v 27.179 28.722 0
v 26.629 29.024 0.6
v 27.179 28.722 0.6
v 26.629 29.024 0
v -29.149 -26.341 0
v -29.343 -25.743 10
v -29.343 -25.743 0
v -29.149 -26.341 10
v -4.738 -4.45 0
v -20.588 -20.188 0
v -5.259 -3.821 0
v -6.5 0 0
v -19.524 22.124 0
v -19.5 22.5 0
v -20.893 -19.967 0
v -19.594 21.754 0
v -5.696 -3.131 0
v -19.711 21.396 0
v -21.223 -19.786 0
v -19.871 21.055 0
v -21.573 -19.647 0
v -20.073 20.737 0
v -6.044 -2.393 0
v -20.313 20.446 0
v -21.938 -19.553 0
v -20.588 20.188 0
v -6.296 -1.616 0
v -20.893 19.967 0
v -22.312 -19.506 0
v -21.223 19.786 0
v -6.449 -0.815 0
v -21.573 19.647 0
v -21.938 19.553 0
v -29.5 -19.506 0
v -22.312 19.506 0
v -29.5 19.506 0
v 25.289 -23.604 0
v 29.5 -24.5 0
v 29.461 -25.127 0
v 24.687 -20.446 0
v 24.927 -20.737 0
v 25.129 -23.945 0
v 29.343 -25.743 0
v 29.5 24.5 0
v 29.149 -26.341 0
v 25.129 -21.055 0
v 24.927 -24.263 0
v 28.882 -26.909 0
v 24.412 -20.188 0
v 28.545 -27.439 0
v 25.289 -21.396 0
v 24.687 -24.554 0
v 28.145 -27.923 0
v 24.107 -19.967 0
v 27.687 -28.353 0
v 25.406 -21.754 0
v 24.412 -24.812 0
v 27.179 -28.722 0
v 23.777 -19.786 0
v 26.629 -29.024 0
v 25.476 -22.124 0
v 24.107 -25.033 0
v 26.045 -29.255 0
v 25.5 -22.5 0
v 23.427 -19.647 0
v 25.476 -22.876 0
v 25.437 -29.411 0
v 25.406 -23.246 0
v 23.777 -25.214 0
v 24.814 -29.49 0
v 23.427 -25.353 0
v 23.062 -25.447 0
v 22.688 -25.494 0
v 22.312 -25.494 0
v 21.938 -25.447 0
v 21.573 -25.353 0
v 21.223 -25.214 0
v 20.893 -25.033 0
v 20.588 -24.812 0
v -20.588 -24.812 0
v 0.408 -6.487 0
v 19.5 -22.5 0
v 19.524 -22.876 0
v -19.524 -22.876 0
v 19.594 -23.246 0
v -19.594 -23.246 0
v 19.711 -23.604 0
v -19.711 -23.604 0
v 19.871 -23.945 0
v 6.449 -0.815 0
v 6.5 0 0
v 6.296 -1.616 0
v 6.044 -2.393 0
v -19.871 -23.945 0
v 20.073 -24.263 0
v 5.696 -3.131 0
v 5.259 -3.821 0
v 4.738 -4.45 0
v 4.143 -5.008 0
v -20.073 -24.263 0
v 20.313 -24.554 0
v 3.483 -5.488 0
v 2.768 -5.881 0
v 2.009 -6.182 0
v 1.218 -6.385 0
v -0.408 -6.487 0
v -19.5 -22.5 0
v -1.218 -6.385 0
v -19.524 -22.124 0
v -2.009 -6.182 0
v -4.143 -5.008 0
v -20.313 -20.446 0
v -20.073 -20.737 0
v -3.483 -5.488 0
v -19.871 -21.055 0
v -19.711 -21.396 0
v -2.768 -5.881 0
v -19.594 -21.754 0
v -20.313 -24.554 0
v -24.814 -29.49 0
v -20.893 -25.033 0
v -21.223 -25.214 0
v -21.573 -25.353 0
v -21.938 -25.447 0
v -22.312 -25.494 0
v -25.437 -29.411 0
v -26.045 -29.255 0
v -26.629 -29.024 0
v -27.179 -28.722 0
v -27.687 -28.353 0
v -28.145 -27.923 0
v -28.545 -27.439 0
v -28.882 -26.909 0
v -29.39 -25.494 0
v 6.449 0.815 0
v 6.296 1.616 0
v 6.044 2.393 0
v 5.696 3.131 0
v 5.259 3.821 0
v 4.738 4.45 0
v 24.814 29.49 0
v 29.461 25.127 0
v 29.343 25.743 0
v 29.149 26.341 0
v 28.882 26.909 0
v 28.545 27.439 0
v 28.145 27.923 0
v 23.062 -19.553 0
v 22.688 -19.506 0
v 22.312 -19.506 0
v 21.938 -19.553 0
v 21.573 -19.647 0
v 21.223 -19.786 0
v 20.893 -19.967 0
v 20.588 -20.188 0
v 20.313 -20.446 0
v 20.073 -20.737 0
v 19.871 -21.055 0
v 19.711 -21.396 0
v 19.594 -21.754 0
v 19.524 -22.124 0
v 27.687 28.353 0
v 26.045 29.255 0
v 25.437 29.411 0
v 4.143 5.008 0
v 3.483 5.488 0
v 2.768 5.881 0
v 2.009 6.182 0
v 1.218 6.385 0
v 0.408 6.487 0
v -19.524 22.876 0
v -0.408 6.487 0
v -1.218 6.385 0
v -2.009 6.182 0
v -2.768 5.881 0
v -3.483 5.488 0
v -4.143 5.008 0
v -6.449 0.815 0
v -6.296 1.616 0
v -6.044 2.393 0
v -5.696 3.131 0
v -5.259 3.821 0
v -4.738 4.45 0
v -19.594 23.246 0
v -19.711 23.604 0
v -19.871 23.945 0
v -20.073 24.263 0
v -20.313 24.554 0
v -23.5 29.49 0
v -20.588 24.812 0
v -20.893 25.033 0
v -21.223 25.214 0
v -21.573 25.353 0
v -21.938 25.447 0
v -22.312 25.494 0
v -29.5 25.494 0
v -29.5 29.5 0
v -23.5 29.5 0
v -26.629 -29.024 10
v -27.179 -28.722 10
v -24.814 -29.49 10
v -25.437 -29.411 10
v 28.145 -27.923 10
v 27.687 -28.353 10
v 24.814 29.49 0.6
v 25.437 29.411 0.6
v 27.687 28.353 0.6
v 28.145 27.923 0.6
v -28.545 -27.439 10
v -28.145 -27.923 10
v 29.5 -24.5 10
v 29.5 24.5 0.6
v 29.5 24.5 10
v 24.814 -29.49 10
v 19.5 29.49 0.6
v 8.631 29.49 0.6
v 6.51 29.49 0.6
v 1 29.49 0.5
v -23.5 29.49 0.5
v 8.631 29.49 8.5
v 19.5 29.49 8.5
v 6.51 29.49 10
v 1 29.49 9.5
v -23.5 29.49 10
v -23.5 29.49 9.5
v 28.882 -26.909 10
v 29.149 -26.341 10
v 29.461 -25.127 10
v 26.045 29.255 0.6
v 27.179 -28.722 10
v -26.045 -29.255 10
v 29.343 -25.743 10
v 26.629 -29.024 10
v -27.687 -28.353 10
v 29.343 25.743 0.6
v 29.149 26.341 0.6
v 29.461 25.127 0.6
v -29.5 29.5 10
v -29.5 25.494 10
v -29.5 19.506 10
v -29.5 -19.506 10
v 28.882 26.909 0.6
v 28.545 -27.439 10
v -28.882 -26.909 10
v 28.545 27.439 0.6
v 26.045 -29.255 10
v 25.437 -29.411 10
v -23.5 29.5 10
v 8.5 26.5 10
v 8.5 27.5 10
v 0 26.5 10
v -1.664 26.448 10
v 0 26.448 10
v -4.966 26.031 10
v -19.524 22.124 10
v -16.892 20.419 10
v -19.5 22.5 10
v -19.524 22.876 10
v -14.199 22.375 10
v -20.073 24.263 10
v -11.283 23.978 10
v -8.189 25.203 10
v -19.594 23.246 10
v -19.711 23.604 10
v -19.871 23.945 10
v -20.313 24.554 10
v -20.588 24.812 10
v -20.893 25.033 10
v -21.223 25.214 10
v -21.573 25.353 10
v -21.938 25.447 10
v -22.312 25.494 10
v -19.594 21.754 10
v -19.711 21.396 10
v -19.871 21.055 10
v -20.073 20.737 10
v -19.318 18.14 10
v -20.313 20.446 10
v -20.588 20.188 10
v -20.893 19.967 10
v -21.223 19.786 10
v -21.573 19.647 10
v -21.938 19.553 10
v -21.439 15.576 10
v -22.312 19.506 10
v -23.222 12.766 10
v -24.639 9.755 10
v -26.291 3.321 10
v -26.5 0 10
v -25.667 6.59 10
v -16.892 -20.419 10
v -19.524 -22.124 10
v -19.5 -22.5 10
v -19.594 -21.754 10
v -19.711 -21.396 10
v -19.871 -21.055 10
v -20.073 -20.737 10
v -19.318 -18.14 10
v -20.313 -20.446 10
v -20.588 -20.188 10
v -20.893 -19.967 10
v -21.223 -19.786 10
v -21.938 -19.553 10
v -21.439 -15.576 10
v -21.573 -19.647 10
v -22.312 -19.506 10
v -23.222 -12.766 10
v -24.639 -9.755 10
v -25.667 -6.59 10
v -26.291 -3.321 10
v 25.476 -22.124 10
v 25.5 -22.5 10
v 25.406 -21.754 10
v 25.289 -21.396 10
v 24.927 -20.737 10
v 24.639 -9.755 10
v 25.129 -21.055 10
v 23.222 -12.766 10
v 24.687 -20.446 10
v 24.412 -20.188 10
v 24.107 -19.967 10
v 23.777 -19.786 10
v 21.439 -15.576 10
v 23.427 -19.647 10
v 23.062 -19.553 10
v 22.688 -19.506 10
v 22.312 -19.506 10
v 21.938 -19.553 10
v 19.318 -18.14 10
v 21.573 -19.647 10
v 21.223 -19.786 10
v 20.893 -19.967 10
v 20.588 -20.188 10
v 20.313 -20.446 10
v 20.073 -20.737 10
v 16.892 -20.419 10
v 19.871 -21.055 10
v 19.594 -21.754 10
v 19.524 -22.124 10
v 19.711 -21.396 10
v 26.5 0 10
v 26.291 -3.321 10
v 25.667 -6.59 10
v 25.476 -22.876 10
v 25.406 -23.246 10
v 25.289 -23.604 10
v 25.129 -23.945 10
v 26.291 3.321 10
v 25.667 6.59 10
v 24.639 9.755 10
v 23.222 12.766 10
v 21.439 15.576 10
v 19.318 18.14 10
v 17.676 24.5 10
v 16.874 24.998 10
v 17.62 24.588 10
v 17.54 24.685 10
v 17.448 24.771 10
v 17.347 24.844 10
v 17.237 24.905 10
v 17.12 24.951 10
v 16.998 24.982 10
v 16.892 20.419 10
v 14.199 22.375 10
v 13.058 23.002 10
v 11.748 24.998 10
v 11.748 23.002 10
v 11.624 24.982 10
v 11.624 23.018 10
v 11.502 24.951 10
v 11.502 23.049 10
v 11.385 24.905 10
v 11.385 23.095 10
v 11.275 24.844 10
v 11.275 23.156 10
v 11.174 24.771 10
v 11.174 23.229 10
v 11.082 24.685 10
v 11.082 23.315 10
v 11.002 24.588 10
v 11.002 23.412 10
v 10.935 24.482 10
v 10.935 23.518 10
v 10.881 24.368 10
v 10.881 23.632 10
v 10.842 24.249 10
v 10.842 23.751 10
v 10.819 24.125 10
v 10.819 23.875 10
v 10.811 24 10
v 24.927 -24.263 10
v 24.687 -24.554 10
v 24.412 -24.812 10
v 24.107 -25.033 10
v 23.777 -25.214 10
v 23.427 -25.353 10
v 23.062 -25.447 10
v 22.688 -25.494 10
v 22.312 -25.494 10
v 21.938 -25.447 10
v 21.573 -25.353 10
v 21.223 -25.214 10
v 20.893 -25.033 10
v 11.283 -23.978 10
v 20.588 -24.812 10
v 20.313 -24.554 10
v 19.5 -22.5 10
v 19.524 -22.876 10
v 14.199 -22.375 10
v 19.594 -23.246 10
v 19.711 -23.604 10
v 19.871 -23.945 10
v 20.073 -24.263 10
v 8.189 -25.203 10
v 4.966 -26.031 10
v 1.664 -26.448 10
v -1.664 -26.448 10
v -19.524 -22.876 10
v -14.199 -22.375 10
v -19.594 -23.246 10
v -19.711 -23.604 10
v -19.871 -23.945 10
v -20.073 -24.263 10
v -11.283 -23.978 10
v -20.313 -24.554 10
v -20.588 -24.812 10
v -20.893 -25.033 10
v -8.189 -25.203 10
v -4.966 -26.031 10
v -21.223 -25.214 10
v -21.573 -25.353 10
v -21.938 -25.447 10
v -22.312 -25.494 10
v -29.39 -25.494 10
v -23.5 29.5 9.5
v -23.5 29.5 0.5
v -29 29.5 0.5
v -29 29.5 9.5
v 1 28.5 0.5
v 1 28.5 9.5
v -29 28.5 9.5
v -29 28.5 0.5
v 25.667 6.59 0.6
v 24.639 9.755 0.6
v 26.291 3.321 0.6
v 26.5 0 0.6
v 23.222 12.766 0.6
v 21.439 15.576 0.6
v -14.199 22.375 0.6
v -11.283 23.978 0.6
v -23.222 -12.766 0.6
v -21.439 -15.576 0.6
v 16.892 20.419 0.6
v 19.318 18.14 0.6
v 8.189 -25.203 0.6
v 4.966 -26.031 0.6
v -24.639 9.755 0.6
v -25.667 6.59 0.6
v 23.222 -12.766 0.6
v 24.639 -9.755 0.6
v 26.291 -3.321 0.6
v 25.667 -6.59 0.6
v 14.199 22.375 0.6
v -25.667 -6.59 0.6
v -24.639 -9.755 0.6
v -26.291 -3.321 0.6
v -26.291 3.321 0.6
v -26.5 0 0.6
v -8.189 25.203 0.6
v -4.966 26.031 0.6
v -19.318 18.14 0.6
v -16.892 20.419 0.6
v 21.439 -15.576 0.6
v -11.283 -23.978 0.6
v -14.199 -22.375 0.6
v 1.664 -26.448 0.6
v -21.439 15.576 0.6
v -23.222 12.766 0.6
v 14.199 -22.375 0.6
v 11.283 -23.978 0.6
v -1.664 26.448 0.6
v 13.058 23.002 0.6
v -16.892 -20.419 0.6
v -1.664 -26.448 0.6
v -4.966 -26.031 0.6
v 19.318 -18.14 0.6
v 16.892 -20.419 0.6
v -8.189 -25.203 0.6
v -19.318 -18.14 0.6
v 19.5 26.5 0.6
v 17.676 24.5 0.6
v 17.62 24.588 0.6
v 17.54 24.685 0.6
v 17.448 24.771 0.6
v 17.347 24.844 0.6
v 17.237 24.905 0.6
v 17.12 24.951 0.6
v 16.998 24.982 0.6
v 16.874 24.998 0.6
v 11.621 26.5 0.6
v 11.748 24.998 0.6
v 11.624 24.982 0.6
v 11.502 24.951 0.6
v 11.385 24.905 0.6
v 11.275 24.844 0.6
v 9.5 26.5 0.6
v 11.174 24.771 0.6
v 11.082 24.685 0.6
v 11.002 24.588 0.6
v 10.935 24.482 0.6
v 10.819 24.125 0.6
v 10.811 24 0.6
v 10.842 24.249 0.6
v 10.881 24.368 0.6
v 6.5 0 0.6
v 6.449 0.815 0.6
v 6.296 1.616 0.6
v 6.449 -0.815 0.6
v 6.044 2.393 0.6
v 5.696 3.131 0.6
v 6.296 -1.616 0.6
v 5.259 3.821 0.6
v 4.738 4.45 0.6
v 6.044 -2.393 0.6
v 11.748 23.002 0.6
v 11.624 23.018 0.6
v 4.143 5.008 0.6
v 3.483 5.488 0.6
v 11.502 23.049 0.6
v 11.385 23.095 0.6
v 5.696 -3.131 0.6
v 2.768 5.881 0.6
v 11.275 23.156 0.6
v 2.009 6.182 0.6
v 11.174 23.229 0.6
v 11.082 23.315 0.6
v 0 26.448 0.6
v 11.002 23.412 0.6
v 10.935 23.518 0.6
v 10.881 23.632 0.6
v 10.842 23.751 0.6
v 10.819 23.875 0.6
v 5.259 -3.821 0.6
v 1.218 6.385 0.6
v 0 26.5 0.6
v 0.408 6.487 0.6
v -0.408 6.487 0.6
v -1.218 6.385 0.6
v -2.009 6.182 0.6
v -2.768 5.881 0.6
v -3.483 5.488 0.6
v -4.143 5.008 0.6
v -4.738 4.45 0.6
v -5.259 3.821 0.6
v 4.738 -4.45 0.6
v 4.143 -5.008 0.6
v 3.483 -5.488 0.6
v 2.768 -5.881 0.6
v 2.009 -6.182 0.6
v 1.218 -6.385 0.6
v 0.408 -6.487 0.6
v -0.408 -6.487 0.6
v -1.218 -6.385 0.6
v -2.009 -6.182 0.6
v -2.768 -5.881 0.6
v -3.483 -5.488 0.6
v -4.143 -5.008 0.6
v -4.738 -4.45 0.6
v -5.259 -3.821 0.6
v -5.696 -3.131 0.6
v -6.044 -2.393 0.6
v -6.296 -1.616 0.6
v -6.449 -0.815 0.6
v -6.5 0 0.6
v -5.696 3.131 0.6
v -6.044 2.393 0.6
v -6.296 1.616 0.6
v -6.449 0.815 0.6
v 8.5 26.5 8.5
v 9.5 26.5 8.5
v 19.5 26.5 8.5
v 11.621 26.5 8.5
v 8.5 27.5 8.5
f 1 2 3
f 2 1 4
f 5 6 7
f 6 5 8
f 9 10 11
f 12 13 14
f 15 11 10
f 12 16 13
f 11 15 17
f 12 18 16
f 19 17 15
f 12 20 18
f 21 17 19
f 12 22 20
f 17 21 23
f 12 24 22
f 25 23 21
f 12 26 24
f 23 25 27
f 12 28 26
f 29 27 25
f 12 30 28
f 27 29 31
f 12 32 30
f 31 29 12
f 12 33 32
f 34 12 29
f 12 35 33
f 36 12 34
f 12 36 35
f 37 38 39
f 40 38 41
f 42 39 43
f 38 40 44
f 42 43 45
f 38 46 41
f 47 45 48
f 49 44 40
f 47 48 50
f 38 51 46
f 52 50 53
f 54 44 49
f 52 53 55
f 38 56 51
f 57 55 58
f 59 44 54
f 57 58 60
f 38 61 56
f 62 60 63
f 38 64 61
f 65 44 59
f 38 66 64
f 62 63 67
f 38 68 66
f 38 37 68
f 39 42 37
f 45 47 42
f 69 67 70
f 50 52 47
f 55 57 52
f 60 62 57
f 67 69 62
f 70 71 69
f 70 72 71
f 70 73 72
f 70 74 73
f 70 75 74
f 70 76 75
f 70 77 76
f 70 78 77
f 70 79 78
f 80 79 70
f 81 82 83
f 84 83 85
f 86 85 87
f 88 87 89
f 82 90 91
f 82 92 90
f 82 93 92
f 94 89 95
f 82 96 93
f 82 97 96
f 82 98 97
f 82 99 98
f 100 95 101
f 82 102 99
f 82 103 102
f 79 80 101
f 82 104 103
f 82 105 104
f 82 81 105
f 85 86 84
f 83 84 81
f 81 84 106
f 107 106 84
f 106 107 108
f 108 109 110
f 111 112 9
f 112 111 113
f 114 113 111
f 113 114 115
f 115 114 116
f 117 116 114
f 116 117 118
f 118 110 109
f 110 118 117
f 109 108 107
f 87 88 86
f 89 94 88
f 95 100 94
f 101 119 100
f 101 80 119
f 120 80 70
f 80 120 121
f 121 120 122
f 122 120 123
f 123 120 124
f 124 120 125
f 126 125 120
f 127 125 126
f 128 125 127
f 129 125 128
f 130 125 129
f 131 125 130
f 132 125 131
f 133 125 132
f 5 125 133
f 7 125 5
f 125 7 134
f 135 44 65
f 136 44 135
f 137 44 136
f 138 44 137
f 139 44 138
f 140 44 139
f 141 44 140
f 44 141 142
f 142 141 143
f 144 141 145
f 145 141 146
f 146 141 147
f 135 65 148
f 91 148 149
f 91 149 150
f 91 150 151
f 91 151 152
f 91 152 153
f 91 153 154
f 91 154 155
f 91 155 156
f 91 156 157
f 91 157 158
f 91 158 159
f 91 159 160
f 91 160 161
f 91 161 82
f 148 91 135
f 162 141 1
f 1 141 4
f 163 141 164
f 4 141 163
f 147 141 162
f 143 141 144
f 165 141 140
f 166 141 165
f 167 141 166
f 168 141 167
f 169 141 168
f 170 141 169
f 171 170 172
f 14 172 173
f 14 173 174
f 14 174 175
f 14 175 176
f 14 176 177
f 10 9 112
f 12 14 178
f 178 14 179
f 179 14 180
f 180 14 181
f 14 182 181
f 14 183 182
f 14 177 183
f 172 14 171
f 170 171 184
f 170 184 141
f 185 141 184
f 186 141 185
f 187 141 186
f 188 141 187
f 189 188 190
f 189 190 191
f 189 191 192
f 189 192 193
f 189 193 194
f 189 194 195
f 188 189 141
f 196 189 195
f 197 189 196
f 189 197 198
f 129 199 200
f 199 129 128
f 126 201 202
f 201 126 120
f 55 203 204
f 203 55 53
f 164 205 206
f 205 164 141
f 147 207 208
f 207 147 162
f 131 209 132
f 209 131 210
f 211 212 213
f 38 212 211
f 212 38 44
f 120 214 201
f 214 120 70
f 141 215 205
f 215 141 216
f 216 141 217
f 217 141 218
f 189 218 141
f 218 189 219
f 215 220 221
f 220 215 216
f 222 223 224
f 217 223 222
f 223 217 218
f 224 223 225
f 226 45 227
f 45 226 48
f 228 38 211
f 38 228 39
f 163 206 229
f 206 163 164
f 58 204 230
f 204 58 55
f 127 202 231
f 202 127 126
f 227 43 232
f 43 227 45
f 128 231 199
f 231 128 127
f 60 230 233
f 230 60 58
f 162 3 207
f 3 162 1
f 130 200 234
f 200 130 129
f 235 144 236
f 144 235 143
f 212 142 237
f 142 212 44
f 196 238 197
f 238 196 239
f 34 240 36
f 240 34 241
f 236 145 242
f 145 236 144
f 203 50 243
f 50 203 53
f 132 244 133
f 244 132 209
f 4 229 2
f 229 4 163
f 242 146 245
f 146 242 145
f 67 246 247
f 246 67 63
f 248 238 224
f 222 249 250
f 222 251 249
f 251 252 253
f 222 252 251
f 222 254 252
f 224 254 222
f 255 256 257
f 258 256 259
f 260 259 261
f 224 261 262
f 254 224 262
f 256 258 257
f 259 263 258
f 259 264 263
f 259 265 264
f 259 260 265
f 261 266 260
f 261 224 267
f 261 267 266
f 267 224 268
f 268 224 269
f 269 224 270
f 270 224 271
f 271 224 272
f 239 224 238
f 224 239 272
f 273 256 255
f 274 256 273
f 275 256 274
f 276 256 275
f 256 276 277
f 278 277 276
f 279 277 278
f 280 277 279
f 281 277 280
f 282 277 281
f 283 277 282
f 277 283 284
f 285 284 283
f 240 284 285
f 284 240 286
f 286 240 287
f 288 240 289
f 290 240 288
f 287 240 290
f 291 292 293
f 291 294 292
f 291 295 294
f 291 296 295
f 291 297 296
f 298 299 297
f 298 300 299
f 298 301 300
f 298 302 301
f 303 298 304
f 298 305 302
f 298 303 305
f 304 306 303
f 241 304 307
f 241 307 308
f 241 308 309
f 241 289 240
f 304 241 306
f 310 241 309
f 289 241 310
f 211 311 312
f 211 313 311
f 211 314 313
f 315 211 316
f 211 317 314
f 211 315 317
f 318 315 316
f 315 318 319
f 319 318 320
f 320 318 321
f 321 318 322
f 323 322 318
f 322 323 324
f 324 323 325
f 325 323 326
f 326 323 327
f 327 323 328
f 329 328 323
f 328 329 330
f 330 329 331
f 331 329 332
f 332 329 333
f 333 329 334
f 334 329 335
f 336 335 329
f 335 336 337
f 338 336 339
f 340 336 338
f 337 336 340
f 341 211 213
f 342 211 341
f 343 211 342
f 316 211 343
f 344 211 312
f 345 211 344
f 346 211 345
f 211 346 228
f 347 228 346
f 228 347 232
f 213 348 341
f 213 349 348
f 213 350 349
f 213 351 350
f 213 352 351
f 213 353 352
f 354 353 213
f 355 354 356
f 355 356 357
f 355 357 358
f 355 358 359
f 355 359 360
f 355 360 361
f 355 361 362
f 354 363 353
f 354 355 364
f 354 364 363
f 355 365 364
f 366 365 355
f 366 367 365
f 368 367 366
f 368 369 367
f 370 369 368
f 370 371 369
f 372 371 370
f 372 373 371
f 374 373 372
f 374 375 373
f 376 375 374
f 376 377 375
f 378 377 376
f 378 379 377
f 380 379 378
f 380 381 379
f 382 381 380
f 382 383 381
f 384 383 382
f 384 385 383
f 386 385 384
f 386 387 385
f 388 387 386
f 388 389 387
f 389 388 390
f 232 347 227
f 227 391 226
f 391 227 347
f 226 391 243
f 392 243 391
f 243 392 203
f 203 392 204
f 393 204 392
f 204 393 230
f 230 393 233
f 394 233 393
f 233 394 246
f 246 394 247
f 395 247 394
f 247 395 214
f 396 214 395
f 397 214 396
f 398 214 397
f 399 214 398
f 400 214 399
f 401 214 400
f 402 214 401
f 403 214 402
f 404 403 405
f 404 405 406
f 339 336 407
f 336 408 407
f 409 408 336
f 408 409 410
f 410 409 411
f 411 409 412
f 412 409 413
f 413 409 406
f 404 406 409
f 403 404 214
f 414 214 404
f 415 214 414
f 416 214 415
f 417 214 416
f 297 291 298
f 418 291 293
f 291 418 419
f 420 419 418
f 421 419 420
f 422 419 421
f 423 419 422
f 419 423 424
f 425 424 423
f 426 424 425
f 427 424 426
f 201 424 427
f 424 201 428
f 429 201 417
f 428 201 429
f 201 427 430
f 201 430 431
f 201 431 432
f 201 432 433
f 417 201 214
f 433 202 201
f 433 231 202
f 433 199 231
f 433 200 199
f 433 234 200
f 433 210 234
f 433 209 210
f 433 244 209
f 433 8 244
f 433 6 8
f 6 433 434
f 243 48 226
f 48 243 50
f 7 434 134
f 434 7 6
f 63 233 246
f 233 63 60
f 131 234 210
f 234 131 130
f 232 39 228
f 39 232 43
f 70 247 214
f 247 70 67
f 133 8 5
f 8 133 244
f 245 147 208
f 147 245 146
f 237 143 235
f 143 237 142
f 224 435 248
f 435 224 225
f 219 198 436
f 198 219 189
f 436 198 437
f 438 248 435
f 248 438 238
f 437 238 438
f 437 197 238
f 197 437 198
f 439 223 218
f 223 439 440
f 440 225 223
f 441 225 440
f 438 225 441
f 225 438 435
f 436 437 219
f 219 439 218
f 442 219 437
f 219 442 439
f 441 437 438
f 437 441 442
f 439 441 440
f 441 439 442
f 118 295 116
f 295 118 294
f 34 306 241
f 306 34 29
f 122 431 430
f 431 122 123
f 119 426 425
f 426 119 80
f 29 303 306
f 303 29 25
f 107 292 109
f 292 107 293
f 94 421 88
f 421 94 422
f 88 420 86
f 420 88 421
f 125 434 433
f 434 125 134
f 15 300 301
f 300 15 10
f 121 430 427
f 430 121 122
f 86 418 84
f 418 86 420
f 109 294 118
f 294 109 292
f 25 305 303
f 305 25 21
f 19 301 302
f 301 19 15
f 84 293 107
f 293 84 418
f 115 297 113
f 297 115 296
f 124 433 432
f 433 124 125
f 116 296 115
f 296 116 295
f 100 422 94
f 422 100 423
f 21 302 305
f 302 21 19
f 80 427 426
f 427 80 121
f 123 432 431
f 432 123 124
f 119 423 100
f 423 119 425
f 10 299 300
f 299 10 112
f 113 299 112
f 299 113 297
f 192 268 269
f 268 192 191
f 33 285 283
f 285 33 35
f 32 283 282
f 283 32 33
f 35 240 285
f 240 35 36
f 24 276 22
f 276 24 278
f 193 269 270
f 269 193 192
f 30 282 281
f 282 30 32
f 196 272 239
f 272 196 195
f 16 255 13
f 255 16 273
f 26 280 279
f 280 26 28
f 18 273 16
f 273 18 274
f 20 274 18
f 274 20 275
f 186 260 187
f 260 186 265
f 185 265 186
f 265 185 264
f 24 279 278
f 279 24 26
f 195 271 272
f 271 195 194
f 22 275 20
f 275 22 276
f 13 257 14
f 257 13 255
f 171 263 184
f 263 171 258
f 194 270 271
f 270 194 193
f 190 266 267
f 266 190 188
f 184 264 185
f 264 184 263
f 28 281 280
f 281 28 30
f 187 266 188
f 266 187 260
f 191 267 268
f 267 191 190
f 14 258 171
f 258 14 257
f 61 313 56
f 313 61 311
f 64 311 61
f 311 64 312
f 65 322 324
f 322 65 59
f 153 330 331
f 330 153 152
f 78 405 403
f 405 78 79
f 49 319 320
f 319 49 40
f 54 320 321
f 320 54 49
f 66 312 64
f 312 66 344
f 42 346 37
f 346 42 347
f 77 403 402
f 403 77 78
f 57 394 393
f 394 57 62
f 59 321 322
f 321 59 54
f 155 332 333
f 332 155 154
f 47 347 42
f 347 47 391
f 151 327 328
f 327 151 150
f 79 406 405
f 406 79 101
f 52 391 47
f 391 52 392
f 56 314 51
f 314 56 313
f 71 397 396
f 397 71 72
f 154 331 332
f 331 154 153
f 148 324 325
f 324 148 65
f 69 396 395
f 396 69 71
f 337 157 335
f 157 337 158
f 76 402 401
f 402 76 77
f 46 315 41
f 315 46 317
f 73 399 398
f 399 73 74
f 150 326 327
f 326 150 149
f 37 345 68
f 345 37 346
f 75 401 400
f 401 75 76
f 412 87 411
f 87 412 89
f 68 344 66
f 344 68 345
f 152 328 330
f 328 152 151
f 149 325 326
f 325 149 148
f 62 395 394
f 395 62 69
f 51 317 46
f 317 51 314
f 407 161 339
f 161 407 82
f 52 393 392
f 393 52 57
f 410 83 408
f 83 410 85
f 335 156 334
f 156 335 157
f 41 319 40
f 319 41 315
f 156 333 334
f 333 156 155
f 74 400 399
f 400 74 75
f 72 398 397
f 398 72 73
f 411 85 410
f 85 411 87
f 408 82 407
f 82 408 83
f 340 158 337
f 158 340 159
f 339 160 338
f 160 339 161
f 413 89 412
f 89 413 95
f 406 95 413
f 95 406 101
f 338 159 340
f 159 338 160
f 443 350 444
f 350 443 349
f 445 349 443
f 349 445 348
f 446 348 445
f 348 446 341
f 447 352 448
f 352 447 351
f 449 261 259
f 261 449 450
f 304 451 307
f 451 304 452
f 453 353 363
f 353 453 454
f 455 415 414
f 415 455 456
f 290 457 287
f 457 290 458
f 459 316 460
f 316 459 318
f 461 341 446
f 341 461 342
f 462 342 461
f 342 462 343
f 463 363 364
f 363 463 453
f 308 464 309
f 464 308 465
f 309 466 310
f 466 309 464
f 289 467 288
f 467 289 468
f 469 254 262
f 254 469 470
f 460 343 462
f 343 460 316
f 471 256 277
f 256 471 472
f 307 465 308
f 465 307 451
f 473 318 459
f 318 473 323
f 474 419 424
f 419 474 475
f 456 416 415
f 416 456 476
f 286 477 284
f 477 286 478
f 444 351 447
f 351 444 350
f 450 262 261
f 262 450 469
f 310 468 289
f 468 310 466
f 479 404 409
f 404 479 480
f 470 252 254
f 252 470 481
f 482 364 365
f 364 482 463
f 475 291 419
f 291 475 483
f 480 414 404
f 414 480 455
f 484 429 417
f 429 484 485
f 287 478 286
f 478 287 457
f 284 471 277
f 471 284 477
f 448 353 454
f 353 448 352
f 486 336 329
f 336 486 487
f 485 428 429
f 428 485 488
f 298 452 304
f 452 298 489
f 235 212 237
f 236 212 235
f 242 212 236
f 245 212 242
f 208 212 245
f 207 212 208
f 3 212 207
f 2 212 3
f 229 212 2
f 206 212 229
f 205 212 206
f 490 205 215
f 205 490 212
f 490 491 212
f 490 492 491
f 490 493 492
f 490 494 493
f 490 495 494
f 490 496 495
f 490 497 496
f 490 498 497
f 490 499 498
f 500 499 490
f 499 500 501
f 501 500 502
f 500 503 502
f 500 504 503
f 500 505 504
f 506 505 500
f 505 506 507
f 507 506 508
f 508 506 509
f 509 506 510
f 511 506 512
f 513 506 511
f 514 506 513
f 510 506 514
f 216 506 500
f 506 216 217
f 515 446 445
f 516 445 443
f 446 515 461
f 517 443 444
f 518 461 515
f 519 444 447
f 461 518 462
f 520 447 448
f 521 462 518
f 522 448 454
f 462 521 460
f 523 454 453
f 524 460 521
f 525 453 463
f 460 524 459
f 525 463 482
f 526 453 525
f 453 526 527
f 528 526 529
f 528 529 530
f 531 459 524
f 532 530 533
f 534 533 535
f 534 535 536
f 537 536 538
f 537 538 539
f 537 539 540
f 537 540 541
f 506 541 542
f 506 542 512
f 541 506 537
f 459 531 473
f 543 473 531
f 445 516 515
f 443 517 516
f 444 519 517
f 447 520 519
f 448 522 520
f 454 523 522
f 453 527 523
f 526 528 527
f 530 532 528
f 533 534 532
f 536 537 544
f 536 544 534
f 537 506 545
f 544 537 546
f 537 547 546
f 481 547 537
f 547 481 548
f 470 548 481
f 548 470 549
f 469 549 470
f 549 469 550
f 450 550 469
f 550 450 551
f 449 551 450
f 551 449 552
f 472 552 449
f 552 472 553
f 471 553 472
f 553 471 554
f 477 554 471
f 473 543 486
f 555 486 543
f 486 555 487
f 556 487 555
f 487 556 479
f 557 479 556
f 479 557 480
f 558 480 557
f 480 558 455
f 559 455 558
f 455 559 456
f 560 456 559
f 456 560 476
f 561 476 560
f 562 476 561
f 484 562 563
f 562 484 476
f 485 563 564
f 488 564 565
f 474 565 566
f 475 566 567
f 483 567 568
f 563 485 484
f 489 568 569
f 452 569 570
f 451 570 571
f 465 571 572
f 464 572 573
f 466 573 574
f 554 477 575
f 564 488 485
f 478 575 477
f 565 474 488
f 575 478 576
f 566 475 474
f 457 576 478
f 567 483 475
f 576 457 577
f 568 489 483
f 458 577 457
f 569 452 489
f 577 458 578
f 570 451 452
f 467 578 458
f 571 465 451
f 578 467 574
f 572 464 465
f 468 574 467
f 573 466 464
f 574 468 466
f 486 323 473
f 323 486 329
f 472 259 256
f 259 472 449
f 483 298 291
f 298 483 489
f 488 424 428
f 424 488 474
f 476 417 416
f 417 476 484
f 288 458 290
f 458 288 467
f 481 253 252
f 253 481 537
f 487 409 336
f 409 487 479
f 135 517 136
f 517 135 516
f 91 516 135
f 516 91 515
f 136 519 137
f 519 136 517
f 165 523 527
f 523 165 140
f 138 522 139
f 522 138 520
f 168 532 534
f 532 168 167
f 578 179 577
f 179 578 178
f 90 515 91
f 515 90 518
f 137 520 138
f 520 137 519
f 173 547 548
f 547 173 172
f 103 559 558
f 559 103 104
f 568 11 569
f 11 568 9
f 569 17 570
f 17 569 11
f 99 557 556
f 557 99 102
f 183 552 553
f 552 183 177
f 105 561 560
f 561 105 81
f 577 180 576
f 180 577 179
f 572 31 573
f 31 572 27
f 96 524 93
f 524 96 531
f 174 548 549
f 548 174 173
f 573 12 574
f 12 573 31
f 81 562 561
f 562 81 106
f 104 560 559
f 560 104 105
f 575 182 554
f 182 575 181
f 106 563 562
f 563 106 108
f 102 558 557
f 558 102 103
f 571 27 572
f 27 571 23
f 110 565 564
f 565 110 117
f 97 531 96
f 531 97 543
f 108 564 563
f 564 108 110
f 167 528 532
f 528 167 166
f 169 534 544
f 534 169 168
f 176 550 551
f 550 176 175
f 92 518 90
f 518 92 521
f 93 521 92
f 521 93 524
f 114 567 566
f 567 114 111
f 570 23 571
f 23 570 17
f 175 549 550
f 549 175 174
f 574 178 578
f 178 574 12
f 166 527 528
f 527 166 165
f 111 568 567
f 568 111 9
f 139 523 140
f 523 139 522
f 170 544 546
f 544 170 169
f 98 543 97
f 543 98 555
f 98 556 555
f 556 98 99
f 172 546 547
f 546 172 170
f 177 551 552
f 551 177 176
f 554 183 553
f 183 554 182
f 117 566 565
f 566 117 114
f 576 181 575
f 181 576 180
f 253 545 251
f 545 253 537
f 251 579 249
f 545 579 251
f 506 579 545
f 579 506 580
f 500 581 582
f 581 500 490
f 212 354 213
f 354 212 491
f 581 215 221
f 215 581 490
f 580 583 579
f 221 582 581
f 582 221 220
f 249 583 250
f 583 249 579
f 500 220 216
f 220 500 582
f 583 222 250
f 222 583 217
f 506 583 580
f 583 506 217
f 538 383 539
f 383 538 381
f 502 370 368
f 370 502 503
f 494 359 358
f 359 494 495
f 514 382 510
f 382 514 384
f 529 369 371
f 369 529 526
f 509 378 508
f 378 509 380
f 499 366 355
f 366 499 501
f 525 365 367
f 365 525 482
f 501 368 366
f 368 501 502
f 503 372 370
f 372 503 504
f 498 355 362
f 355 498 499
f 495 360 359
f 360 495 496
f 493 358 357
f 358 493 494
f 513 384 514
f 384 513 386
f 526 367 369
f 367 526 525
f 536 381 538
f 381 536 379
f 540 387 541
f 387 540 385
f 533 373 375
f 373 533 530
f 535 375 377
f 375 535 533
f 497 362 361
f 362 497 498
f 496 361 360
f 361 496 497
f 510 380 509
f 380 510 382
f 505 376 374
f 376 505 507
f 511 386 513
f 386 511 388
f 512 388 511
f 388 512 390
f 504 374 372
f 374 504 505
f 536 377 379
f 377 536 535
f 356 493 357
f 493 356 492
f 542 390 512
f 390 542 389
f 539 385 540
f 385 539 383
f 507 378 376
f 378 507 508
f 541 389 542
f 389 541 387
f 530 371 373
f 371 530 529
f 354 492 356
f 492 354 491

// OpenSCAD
$fn = 50;


union() {
	difference() {
		union() {
			translate(v = [0, 0, 0]) {
				rotate(a = [0, 0, 0]) {
					hull() {
						translate(v = [-24.5000000000, 24.5000000000, 0]) {
							rotate(a = [0, 0, 0]) {
								translate(v = [0, 0, 0]) {
									rotate(a = [0, 0, 0]) {
										cylinder(h = 10, r = 5);
									}
								}
							}
						}
						translate(v = [24.5000000000, 24.5000000000, 0]) {
							rotate(a = [0, 0, 0]) {
								translate(v = [0, 0, 0]) {
									rotate(a = [0, 0, 0]) {
										cylinder(h = 10, r = 5);
									}
								}
							}
						}
						translate(v = [-24.5000000000, -24.5000000000, 0]) {
							rotate(a = [0, 0, 0]) {
								translate(v = [0, 0, 0]) {
									rotate(a = [0, 0, 0]) {
										cylinder(h = 10, r = 5);
									}
								}
							}
						}
						translate(v = [24.5000000000, -24.5000000000, 0]) {
							rotate(a = [0, 0, 0]) {
								translate(v = [0, 0, 0]) {
									rotate(a = [0, 0, 0]) {
										cylinder(h = 10, r = 5);
									}
								}
							}
						}
					}
				}
			}
			translate(v = [-29.5000000000, 23.5000000000, 0]) {
				rotate(a = [0, 0, 0]) {
					cube(size = [6, 6, 10]);
				}
			}
		}
		union() {
			translate(v = [-29.0000000000, 28.5000000000, 0.5000000000]) {
				rotate(a = [0, 0, 0]) {
					cube(size = [30, 1, 9.0000000000]);
				}
			}
			translate(v = [-30.0000000000, -22.5000000000, -125]) {
				rotate(a = [0, 0, 0]) {
					hull() {
						translate(v = [7.5000000000, 0, 0]) {
							rotate(a = [0, 0, 0]) {
								translate(v = [0, 0, 0]) {
									rotate(a = [0, 0, 0]) {
										cylinder(h = 250, r = 3.0000000000);
									}
								}
							}
						}
						translate(v = [-7.5000000000, 0, 0]) {
							rotate(a = [0, 0, 0]) {
								translate(v = [0, 0, 0]) {
									rotate(a = [0, 0, 0]) {
										cylinder(h = 250, r = 3.0000000000);
									}
								}
							}
						}
					}
				}
			}
			translate(v = [-30.0000000000, 22.5000000000, -125]) {
				rotate(a = [0, 0, 0]) {
					hull() {
						translate(v = [7.5000000000, 0, 0]) {
							rotate(a = [0, 0, 0]) {
								translate(v = [0, 0, 0]) {
									rotate(a = [0, 0, 0]) {
										cylinder(h = 250, r = 3.0000000000);
									}
								}
							}
						}
						translate(v = [-7.5000000000, 0, 0]) {
							rotate(a = [0, 0, 0]) {
								translate(v = [0, 0, 0]) {
									rotate(a = [0, 0, 0]) {
										cylinder(h = 250, r = 3.0000000000);
									}
								}
							}
						}
					}
				}
			}
			translate(v = [22.5000000000, -22.5000000000, -125.0000000000]) {
				rotate(a = [0, 0, 0]) {
					cylinder(h = 250, r = 3.0000000000);
				}
			}
			translate(v = [0, 0, 0.6000000000]) {
				rotate(a = [0, 0, 0]) {
					cylinder(h = 12.4000000000, r = 26.5000000000);
				}
			}
			translate(v = [0, 0, -5.0000000000]) {
				rotate(a = [0, 0, 0]) {
					cylinder(h = 10, r = 6.5000000000);
				}
			}
			translate(v = [0.0000000000, 24.5000000000, 0.6000000000]) {
				rotate(a = [0, 0, 0]) {
					cube(size = [29.5000000000, 2, 12.4000000000]);
				}
			}
			translate(v = [19.5000000000, 24.5000000000, 0.6000000000]) {
				rotate(a = [0, 0, 0]) {
					cube(size = [10, 5, 12.4000000000]);
				}
			}
			translate(v = [8.5000000000, 24.5000000000, 8.5000000000]) {
				rotate(a = [0, 0, 0]) {
					cube(size = [21, 5, 1.5000000000]);
				}
			}
			translate(v = [5.7500000000, 30.2500000000, 0.6000000000]) {
				rotate(a = [0, 0, -45]) {
					cube(size = [7.5000000000, 1.5000000000, 12.4000000000]);
				}
			}
			translate(v = [5.0610000000, 23.0000000000, 0.6000000000]) {
				rotate(a = [0, 0, 0]) {
					cube(size = [7.5000000000, 2, 9.4000000000]);
				}
			}
		}
	}
	union() {
		translate(v = [14.3110000000, 24.0000000000, 0]) {
			rotate(a = [0, 0, 0]) {
				hull() {
					translate(v = [2.5000000000, 0, 0]) {
						rotate(a = [0, 0, 0]) {
							translate(v = [0, 0, 0]) {
								rotate(a = [0, 0, 0]) {
									cylinder(h = 10, r = 1.0000000000);
								}
							}
						}
					}
					translate(v = [-2.5000000000, 0, 0]) {
						rotate(a = [0, 0, 0]) {
							translate(v = [0, 0, 0]) {
								rotate(a = [0, 0, 0]) {
									cylinder(h = 10, r = 1.0000000000);
								}
							}
						}
					}
				}
			}
		}
	}
}
